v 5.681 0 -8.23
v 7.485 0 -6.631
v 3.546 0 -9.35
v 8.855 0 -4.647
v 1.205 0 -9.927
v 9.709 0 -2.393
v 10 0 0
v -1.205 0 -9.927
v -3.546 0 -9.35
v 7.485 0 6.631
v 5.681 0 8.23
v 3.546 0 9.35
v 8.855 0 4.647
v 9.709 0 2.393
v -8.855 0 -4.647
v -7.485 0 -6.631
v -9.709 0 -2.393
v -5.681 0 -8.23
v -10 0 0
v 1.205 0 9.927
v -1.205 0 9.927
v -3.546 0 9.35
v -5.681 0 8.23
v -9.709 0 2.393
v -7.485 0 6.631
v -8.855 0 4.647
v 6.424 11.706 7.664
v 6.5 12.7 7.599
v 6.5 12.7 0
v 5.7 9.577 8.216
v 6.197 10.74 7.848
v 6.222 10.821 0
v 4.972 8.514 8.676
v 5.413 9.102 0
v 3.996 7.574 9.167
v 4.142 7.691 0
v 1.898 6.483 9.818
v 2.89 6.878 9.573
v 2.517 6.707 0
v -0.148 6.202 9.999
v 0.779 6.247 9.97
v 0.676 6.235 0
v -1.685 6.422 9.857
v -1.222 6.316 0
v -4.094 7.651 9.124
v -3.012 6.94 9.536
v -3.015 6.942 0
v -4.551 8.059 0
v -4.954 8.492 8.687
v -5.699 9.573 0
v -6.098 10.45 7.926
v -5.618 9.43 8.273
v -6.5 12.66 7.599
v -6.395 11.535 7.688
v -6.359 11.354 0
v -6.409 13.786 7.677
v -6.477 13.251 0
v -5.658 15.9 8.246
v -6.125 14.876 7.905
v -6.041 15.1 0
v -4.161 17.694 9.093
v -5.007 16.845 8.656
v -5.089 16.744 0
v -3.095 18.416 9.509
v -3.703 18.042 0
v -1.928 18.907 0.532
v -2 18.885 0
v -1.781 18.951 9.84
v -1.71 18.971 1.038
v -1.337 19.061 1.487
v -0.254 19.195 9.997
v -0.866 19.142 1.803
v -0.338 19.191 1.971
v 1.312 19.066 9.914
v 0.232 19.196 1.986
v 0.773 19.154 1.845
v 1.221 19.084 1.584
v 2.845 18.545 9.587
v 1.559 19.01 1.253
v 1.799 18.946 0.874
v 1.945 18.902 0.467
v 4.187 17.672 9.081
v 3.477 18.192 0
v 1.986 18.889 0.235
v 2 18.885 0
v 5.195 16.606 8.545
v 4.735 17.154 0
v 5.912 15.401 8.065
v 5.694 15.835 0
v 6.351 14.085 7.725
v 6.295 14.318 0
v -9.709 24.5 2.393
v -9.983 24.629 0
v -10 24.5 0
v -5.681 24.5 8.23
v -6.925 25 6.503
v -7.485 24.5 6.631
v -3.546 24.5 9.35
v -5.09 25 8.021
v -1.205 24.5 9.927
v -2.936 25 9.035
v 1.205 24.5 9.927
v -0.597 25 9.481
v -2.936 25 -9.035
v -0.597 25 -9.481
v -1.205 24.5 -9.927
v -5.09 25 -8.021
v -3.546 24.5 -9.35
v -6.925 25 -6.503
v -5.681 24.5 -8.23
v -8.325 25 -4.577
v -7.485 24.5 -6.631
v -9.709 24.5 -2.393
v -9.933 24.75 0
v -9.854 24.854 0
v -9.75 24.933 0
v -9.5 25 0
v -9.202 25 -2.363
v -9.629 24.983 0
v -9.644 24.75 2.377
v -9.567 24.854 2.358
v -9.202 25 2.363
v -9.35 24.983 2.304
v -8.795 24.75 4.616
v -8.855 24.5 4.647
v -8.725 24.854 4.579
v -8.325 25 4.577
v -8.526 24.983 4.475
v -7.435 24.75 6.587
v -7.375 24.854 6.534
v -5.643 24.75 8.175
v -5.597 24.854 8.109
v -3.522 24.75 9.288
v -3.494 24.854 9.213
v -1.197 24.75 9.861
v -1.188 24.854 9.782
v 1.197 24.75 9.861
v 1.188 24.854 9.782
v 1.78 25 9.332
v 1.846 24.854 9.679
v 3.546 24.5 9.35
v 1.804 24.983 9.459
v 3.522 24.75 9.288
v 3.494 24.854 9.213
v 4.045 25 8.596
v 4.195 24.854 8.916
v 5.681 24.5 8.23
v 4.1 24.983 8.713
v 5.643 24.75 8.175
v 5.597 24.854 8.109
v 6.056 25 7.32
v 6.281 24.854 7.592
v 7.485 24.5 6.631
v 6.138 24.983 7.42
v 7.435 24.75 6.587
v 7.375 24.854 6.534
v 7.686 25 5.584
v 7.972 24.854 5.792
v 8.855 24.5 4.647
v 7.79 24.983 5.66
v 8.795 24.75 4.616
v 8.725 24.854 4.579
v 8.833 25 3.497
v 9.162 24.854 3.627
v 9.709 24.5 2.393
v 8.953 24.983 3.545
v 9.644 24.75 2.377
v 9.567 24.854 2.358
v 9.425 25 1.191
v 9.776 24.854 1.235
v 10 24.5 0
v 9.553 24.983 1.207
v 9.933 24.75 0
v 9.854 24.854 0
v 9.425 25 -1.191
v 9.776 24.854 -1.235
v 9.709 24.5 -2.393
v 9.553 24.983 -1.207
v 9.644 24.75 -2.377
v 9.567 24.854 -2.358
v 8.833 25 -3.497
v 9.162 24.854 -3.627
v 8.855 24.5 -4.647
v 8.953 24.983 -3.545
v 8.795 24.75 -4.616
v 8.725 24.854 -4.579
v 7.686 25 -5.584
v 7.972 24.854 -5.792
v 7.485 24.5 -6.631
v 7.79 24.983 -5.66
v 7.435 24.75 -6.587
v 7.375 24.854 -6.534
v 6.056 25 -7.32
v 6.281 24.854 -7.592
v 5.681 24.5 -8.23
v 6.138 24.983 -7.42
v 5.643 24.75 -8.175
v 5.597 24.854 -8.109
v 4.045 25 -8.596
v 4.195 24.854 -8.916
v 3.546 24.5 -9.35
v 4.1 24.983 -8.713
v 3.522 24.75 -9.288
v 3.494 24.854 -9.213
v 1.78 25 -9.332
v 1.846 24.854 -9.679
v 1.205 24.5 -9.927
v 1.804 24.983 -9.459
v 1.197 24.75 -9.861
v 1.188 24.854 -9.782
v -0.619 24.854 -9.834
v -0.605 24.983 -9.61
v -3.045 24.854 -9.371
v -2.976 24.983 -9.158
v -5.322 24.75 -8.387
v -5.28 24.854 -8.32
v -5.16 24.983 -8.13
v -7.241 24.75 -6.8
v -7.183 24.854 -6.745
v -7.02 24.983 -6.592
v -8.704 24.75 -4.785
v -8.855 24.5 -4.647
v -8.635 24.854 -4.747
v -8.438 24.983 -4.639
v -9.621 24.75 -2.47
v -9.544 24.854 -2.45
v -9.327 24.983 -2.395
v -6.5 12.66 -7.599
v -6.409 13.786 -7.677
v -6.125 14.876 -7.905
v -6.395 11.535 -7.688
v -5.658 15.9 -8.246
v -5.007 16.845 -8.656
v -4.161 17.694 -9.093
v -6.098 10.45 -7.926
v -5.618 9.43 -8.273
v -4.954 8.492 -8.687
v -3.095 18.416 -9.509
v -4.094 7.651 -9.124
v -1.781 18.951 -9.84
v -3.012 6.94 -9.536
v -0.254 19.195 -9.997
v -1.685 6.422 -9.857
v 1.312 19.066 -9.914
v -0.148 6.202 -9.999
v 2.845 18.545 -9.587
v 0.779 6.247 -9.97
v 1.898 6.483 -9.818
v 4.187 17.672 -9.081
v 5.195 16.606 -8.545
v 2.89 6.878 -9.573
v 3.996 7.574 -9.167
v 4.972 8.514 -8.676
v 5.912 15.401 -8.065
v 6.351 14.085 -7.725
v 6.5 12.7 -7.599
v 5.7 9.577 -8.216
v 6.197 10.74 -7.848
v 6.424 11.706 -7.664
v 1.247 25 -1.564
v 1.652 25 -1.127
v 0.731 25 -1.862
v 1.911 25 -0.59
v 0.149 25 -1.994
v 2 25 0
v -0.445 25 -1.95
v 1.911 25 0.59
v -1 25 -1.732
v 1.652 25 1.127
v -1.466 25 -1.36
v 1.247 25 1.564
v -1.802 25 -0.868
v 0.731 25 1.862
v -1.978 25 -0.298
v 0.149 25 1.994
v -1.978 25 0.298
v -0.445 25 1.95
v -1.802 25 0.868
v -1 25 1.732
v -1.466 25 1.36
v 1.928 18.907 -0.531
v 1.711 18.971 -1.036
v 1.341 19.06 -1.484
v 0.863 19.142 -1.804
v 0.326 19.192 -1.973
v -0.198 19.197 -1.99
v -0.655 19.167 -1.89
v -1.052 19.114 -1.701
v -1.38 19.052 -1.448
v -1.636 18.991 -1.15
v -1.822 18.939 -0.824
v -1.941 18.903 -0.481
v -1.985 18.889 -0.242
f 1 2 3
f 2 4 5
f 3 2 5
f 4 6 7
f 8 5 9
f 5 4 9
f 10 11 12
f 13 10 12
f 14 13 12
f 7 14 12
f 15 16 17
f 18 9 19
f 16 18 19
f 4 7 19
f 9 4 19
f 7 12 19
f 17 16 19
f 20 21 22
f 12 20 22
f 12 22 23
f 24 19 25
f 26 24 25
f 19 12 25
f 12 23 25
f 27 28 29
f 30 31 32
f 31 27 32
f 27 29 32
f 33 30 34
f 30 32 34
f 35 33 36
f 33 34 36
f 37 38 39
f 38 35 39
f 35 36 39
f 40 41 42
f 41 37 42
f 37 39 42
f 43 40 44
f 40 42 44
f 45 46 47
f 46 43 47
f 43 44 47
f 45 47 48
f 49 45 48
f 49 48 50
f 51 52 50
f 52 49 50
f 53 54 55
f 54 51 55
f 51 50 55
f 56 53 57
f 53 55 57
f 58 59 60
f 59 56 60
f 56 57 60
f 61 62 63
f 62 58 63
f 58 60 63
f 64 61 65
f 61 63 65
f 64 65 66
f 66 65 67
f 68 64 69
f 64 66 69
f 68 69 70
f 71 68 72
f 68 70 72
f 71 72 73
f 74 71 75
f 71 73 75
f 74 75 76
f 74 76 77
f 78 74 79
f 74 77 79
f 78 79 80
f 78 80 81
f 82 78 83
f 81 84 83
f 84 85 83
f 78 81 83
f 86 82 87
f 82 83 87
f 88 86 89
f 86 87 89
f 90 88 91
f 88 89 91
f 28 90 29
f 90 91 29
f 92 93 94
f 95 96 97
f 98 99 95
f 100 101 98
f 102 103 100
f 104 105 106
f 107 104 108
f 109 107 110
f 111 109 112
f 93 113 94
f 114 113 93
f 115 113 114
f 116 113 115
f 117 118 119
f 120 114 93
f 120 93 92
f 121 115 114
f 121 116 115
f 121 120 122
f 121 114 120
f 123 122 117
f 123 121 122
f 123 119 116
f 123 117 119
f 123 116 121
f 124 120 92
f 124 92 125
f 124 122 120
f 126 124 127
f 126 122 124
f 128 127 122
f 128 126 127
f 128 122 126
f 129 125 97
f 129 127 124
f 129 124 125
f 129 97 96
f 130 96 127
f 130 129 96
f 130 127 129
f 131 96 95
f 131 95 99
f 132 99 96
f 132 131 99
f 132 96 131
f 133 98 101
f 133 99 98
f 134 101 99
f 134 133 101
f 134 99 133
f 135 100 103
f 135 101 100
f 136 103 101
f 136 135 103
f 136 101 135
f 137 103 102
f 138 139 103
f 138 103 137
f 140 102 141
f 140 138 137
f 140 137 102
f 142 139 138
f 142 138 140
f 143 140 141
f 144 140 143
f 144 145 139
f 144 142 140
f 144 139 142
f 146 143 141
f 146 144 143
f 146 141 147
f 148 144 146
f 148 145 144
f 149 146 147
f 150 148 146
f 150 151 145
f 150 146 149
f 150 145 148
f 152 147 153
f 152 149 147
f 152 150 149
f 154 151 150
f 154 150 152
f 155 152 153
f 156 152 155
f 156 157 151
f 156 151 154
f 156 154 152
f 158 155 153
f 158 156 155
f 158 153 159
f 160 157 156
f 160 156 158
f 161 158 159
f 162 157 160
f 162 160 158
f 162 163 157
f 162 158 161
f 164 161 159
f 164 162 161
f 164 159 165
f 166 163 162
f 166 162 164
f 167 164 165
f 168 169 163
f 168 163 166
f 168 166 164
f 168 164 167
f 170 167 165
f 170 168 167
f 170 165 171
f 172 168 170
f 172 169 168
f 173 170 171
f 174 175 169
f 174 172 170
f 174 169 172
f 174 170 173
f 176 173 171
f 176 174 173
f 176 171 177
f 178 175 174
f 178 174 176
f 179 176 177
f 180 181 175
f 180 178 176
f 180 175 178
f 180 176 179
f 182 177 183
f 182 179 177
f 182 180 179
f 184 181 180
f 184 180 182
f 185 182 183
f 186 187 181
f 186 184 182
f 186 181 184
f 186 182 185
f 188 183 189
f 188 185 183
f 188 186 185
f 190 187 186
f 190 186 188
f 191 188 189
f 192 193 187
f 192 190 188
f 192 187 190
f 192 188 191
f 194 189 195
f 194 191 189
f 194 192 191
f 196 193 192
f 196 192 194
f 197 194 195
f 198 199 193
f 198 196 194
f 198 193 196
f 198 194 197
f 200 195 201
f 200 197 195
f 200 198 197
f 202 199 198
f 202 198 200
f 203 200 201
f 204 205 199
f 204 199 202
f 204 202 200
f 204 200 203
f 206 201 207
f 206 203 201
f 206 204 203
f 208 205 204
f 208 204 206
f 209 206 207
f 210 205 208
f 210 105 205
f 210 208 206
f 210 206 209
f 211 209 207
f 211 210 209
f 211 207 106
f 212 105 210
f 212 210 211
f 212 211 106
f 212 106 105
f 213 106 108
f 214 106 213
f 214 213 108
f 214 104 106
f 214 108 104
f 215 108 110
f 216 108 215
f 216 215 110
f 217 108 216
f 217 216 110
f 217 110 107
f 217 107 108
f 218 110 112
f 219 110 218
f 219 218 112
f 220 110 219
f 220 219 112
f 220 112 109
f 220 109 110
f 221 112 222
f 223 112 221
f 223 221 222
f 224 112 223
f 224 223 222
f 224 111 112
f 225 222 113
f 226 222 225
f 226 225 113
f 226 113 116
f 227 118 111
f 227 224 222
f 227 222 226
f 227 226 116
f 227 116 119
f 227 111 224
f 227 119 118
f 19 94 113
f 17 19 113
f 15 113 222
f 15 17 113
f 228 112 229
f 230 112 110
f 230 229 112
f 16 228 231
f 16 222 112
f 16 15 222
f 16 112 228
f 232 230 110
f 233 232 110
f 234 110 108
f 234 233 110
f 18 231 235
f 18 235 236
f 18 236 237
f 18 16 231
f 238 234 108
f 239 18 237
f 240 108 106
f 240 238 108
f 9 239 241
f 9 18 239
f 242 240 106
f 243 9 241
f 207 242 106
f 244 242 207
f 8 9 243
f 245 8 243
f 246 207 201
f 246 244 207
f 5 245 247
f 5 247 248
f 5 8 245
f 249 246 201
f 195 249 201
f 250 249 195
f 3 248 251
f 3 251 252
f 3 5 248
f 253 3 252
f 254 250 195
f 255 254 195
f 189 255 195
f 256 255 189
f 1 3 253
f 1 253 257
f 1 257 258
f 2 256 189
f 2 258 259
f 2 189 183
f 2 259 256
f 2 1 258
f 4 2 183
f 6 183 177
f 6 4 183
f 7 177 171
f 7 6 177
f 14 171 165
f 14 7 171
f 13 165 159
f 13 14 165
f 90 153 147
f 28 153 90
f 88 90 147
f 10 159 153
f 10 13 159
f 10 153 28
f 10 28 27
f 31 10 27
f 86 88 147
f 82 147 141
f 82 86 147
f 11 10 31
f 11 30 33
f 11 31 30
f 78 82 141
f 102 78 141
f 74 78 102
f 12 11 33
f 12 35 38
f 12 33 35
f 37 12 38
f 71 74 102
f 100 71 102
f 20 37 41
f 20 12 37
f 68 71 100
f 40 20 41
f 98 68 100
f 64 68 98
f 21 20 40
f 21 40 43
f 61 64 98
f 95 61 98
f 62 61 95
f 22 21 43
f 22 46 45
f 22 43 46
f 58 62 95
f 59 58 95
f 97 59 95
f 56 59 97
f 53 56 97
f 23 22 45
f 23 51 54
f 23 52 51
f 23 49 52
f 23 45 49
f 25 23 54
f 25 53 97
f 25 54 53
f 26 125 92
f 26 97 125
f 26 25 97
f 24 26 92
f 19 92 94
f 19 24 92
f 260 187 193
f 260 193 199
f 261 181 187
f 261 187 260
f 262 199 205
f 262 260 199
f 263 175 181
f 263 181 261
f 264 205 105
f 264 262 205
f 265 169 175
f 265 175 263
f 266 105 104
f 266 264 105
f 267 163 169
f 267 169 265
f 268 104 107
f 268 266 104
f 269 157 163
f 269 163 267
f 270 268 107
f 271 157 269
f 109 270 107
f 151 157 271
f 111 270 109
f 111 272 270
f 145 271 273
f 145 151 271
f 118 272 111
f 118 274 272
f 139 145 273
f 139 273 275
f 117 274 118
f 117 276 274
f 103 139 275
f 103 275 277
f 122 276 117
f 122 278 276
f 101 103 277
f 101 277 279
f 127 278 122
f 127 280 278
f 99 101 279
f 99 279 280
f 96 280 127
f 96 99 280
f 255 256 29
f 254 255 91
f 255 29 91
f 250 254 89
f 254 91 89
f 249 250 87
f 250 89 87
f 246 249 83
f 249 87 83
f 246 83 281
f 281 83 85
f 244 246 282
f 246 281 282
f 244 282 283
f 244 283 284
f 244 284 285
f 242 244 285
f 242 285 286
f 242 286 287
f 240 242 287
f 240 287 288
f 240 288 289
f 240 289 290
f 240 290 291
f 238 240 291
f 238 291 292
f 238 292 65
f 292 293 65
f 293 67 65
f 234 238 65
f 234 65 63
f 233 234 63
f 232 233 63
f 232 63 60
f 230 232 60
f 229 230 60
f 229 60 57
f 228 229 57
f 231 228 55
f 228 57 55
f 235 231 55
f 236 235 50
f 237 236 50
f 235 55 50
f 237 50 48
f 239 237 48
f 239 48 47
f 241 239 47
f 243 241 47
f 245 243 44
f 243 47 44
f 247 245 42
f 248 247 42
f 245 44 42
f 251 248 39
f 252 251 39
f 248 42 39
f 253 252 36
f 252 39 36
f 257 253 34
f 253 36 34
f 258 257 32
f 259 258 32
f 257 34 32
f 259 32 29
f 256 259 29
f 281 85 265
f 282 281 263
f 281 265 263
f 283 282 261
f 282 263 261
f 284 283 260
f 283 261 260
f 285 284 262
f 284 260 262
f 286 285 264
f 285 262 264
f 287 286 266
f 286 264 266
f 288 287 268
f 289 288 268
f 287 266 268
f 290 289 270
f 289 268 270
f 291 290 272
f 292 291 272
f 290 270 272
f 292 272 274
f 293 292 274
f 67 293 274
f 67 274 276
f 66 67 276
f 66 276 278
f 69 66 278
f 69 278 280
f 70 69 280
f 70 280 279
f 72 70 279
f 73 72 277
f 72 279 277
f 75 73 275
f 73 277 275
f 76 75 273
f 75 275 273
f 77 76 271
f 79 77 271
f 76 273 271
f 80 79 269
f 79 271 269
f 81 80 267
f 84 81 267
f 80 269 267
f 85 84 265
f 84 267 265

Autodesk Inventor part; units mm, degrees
ref_plane "YZ Plane" through (0, 0, 0) normal (1, 0, 0) x (0, 1, 0)
ref_plane "XZ Plane" through (0, 0, 0) normal (0, 1, 0) x (-1, 0, 0)
ref_plane "XY Plane" through (0, 0, 0) normal (0, 0, 1) x (1, 0, 0)
sketch "Sketch1" plane through (0, 0, 0) normal (0, 1, 0) x (-1, 0, 0)
  circle A0 centre (0, 0) radius 10
extrude "Extrusion1" add sketch "Sketch1" along normal blind 25
sketch "Sketch2" plane through (0, 0, 0) normal (0, 0, 1) x (1, 0, 0)
  line L0 (0, 0) -> (0, 12.7) construction
  circle A0 centre (0, 12.7) radius 6.5
extrude "Extrusion2" cut sketch "Sketch2" along normal through all both and the other way through all
sketch "Sketch3" plane through (0, 25, 0) normal (0, 1, 0) x (1, 0, 0)
  circle A0 centre (0, 0) radius 2
  dimension "d7" = 4
extrude "Extrusion3" cut sketch "Sketch3" against normal up to surface
fillet "Fillet1" radius 0.5 1 edges at (10, 25, 0)
properties part number "Cursore"
